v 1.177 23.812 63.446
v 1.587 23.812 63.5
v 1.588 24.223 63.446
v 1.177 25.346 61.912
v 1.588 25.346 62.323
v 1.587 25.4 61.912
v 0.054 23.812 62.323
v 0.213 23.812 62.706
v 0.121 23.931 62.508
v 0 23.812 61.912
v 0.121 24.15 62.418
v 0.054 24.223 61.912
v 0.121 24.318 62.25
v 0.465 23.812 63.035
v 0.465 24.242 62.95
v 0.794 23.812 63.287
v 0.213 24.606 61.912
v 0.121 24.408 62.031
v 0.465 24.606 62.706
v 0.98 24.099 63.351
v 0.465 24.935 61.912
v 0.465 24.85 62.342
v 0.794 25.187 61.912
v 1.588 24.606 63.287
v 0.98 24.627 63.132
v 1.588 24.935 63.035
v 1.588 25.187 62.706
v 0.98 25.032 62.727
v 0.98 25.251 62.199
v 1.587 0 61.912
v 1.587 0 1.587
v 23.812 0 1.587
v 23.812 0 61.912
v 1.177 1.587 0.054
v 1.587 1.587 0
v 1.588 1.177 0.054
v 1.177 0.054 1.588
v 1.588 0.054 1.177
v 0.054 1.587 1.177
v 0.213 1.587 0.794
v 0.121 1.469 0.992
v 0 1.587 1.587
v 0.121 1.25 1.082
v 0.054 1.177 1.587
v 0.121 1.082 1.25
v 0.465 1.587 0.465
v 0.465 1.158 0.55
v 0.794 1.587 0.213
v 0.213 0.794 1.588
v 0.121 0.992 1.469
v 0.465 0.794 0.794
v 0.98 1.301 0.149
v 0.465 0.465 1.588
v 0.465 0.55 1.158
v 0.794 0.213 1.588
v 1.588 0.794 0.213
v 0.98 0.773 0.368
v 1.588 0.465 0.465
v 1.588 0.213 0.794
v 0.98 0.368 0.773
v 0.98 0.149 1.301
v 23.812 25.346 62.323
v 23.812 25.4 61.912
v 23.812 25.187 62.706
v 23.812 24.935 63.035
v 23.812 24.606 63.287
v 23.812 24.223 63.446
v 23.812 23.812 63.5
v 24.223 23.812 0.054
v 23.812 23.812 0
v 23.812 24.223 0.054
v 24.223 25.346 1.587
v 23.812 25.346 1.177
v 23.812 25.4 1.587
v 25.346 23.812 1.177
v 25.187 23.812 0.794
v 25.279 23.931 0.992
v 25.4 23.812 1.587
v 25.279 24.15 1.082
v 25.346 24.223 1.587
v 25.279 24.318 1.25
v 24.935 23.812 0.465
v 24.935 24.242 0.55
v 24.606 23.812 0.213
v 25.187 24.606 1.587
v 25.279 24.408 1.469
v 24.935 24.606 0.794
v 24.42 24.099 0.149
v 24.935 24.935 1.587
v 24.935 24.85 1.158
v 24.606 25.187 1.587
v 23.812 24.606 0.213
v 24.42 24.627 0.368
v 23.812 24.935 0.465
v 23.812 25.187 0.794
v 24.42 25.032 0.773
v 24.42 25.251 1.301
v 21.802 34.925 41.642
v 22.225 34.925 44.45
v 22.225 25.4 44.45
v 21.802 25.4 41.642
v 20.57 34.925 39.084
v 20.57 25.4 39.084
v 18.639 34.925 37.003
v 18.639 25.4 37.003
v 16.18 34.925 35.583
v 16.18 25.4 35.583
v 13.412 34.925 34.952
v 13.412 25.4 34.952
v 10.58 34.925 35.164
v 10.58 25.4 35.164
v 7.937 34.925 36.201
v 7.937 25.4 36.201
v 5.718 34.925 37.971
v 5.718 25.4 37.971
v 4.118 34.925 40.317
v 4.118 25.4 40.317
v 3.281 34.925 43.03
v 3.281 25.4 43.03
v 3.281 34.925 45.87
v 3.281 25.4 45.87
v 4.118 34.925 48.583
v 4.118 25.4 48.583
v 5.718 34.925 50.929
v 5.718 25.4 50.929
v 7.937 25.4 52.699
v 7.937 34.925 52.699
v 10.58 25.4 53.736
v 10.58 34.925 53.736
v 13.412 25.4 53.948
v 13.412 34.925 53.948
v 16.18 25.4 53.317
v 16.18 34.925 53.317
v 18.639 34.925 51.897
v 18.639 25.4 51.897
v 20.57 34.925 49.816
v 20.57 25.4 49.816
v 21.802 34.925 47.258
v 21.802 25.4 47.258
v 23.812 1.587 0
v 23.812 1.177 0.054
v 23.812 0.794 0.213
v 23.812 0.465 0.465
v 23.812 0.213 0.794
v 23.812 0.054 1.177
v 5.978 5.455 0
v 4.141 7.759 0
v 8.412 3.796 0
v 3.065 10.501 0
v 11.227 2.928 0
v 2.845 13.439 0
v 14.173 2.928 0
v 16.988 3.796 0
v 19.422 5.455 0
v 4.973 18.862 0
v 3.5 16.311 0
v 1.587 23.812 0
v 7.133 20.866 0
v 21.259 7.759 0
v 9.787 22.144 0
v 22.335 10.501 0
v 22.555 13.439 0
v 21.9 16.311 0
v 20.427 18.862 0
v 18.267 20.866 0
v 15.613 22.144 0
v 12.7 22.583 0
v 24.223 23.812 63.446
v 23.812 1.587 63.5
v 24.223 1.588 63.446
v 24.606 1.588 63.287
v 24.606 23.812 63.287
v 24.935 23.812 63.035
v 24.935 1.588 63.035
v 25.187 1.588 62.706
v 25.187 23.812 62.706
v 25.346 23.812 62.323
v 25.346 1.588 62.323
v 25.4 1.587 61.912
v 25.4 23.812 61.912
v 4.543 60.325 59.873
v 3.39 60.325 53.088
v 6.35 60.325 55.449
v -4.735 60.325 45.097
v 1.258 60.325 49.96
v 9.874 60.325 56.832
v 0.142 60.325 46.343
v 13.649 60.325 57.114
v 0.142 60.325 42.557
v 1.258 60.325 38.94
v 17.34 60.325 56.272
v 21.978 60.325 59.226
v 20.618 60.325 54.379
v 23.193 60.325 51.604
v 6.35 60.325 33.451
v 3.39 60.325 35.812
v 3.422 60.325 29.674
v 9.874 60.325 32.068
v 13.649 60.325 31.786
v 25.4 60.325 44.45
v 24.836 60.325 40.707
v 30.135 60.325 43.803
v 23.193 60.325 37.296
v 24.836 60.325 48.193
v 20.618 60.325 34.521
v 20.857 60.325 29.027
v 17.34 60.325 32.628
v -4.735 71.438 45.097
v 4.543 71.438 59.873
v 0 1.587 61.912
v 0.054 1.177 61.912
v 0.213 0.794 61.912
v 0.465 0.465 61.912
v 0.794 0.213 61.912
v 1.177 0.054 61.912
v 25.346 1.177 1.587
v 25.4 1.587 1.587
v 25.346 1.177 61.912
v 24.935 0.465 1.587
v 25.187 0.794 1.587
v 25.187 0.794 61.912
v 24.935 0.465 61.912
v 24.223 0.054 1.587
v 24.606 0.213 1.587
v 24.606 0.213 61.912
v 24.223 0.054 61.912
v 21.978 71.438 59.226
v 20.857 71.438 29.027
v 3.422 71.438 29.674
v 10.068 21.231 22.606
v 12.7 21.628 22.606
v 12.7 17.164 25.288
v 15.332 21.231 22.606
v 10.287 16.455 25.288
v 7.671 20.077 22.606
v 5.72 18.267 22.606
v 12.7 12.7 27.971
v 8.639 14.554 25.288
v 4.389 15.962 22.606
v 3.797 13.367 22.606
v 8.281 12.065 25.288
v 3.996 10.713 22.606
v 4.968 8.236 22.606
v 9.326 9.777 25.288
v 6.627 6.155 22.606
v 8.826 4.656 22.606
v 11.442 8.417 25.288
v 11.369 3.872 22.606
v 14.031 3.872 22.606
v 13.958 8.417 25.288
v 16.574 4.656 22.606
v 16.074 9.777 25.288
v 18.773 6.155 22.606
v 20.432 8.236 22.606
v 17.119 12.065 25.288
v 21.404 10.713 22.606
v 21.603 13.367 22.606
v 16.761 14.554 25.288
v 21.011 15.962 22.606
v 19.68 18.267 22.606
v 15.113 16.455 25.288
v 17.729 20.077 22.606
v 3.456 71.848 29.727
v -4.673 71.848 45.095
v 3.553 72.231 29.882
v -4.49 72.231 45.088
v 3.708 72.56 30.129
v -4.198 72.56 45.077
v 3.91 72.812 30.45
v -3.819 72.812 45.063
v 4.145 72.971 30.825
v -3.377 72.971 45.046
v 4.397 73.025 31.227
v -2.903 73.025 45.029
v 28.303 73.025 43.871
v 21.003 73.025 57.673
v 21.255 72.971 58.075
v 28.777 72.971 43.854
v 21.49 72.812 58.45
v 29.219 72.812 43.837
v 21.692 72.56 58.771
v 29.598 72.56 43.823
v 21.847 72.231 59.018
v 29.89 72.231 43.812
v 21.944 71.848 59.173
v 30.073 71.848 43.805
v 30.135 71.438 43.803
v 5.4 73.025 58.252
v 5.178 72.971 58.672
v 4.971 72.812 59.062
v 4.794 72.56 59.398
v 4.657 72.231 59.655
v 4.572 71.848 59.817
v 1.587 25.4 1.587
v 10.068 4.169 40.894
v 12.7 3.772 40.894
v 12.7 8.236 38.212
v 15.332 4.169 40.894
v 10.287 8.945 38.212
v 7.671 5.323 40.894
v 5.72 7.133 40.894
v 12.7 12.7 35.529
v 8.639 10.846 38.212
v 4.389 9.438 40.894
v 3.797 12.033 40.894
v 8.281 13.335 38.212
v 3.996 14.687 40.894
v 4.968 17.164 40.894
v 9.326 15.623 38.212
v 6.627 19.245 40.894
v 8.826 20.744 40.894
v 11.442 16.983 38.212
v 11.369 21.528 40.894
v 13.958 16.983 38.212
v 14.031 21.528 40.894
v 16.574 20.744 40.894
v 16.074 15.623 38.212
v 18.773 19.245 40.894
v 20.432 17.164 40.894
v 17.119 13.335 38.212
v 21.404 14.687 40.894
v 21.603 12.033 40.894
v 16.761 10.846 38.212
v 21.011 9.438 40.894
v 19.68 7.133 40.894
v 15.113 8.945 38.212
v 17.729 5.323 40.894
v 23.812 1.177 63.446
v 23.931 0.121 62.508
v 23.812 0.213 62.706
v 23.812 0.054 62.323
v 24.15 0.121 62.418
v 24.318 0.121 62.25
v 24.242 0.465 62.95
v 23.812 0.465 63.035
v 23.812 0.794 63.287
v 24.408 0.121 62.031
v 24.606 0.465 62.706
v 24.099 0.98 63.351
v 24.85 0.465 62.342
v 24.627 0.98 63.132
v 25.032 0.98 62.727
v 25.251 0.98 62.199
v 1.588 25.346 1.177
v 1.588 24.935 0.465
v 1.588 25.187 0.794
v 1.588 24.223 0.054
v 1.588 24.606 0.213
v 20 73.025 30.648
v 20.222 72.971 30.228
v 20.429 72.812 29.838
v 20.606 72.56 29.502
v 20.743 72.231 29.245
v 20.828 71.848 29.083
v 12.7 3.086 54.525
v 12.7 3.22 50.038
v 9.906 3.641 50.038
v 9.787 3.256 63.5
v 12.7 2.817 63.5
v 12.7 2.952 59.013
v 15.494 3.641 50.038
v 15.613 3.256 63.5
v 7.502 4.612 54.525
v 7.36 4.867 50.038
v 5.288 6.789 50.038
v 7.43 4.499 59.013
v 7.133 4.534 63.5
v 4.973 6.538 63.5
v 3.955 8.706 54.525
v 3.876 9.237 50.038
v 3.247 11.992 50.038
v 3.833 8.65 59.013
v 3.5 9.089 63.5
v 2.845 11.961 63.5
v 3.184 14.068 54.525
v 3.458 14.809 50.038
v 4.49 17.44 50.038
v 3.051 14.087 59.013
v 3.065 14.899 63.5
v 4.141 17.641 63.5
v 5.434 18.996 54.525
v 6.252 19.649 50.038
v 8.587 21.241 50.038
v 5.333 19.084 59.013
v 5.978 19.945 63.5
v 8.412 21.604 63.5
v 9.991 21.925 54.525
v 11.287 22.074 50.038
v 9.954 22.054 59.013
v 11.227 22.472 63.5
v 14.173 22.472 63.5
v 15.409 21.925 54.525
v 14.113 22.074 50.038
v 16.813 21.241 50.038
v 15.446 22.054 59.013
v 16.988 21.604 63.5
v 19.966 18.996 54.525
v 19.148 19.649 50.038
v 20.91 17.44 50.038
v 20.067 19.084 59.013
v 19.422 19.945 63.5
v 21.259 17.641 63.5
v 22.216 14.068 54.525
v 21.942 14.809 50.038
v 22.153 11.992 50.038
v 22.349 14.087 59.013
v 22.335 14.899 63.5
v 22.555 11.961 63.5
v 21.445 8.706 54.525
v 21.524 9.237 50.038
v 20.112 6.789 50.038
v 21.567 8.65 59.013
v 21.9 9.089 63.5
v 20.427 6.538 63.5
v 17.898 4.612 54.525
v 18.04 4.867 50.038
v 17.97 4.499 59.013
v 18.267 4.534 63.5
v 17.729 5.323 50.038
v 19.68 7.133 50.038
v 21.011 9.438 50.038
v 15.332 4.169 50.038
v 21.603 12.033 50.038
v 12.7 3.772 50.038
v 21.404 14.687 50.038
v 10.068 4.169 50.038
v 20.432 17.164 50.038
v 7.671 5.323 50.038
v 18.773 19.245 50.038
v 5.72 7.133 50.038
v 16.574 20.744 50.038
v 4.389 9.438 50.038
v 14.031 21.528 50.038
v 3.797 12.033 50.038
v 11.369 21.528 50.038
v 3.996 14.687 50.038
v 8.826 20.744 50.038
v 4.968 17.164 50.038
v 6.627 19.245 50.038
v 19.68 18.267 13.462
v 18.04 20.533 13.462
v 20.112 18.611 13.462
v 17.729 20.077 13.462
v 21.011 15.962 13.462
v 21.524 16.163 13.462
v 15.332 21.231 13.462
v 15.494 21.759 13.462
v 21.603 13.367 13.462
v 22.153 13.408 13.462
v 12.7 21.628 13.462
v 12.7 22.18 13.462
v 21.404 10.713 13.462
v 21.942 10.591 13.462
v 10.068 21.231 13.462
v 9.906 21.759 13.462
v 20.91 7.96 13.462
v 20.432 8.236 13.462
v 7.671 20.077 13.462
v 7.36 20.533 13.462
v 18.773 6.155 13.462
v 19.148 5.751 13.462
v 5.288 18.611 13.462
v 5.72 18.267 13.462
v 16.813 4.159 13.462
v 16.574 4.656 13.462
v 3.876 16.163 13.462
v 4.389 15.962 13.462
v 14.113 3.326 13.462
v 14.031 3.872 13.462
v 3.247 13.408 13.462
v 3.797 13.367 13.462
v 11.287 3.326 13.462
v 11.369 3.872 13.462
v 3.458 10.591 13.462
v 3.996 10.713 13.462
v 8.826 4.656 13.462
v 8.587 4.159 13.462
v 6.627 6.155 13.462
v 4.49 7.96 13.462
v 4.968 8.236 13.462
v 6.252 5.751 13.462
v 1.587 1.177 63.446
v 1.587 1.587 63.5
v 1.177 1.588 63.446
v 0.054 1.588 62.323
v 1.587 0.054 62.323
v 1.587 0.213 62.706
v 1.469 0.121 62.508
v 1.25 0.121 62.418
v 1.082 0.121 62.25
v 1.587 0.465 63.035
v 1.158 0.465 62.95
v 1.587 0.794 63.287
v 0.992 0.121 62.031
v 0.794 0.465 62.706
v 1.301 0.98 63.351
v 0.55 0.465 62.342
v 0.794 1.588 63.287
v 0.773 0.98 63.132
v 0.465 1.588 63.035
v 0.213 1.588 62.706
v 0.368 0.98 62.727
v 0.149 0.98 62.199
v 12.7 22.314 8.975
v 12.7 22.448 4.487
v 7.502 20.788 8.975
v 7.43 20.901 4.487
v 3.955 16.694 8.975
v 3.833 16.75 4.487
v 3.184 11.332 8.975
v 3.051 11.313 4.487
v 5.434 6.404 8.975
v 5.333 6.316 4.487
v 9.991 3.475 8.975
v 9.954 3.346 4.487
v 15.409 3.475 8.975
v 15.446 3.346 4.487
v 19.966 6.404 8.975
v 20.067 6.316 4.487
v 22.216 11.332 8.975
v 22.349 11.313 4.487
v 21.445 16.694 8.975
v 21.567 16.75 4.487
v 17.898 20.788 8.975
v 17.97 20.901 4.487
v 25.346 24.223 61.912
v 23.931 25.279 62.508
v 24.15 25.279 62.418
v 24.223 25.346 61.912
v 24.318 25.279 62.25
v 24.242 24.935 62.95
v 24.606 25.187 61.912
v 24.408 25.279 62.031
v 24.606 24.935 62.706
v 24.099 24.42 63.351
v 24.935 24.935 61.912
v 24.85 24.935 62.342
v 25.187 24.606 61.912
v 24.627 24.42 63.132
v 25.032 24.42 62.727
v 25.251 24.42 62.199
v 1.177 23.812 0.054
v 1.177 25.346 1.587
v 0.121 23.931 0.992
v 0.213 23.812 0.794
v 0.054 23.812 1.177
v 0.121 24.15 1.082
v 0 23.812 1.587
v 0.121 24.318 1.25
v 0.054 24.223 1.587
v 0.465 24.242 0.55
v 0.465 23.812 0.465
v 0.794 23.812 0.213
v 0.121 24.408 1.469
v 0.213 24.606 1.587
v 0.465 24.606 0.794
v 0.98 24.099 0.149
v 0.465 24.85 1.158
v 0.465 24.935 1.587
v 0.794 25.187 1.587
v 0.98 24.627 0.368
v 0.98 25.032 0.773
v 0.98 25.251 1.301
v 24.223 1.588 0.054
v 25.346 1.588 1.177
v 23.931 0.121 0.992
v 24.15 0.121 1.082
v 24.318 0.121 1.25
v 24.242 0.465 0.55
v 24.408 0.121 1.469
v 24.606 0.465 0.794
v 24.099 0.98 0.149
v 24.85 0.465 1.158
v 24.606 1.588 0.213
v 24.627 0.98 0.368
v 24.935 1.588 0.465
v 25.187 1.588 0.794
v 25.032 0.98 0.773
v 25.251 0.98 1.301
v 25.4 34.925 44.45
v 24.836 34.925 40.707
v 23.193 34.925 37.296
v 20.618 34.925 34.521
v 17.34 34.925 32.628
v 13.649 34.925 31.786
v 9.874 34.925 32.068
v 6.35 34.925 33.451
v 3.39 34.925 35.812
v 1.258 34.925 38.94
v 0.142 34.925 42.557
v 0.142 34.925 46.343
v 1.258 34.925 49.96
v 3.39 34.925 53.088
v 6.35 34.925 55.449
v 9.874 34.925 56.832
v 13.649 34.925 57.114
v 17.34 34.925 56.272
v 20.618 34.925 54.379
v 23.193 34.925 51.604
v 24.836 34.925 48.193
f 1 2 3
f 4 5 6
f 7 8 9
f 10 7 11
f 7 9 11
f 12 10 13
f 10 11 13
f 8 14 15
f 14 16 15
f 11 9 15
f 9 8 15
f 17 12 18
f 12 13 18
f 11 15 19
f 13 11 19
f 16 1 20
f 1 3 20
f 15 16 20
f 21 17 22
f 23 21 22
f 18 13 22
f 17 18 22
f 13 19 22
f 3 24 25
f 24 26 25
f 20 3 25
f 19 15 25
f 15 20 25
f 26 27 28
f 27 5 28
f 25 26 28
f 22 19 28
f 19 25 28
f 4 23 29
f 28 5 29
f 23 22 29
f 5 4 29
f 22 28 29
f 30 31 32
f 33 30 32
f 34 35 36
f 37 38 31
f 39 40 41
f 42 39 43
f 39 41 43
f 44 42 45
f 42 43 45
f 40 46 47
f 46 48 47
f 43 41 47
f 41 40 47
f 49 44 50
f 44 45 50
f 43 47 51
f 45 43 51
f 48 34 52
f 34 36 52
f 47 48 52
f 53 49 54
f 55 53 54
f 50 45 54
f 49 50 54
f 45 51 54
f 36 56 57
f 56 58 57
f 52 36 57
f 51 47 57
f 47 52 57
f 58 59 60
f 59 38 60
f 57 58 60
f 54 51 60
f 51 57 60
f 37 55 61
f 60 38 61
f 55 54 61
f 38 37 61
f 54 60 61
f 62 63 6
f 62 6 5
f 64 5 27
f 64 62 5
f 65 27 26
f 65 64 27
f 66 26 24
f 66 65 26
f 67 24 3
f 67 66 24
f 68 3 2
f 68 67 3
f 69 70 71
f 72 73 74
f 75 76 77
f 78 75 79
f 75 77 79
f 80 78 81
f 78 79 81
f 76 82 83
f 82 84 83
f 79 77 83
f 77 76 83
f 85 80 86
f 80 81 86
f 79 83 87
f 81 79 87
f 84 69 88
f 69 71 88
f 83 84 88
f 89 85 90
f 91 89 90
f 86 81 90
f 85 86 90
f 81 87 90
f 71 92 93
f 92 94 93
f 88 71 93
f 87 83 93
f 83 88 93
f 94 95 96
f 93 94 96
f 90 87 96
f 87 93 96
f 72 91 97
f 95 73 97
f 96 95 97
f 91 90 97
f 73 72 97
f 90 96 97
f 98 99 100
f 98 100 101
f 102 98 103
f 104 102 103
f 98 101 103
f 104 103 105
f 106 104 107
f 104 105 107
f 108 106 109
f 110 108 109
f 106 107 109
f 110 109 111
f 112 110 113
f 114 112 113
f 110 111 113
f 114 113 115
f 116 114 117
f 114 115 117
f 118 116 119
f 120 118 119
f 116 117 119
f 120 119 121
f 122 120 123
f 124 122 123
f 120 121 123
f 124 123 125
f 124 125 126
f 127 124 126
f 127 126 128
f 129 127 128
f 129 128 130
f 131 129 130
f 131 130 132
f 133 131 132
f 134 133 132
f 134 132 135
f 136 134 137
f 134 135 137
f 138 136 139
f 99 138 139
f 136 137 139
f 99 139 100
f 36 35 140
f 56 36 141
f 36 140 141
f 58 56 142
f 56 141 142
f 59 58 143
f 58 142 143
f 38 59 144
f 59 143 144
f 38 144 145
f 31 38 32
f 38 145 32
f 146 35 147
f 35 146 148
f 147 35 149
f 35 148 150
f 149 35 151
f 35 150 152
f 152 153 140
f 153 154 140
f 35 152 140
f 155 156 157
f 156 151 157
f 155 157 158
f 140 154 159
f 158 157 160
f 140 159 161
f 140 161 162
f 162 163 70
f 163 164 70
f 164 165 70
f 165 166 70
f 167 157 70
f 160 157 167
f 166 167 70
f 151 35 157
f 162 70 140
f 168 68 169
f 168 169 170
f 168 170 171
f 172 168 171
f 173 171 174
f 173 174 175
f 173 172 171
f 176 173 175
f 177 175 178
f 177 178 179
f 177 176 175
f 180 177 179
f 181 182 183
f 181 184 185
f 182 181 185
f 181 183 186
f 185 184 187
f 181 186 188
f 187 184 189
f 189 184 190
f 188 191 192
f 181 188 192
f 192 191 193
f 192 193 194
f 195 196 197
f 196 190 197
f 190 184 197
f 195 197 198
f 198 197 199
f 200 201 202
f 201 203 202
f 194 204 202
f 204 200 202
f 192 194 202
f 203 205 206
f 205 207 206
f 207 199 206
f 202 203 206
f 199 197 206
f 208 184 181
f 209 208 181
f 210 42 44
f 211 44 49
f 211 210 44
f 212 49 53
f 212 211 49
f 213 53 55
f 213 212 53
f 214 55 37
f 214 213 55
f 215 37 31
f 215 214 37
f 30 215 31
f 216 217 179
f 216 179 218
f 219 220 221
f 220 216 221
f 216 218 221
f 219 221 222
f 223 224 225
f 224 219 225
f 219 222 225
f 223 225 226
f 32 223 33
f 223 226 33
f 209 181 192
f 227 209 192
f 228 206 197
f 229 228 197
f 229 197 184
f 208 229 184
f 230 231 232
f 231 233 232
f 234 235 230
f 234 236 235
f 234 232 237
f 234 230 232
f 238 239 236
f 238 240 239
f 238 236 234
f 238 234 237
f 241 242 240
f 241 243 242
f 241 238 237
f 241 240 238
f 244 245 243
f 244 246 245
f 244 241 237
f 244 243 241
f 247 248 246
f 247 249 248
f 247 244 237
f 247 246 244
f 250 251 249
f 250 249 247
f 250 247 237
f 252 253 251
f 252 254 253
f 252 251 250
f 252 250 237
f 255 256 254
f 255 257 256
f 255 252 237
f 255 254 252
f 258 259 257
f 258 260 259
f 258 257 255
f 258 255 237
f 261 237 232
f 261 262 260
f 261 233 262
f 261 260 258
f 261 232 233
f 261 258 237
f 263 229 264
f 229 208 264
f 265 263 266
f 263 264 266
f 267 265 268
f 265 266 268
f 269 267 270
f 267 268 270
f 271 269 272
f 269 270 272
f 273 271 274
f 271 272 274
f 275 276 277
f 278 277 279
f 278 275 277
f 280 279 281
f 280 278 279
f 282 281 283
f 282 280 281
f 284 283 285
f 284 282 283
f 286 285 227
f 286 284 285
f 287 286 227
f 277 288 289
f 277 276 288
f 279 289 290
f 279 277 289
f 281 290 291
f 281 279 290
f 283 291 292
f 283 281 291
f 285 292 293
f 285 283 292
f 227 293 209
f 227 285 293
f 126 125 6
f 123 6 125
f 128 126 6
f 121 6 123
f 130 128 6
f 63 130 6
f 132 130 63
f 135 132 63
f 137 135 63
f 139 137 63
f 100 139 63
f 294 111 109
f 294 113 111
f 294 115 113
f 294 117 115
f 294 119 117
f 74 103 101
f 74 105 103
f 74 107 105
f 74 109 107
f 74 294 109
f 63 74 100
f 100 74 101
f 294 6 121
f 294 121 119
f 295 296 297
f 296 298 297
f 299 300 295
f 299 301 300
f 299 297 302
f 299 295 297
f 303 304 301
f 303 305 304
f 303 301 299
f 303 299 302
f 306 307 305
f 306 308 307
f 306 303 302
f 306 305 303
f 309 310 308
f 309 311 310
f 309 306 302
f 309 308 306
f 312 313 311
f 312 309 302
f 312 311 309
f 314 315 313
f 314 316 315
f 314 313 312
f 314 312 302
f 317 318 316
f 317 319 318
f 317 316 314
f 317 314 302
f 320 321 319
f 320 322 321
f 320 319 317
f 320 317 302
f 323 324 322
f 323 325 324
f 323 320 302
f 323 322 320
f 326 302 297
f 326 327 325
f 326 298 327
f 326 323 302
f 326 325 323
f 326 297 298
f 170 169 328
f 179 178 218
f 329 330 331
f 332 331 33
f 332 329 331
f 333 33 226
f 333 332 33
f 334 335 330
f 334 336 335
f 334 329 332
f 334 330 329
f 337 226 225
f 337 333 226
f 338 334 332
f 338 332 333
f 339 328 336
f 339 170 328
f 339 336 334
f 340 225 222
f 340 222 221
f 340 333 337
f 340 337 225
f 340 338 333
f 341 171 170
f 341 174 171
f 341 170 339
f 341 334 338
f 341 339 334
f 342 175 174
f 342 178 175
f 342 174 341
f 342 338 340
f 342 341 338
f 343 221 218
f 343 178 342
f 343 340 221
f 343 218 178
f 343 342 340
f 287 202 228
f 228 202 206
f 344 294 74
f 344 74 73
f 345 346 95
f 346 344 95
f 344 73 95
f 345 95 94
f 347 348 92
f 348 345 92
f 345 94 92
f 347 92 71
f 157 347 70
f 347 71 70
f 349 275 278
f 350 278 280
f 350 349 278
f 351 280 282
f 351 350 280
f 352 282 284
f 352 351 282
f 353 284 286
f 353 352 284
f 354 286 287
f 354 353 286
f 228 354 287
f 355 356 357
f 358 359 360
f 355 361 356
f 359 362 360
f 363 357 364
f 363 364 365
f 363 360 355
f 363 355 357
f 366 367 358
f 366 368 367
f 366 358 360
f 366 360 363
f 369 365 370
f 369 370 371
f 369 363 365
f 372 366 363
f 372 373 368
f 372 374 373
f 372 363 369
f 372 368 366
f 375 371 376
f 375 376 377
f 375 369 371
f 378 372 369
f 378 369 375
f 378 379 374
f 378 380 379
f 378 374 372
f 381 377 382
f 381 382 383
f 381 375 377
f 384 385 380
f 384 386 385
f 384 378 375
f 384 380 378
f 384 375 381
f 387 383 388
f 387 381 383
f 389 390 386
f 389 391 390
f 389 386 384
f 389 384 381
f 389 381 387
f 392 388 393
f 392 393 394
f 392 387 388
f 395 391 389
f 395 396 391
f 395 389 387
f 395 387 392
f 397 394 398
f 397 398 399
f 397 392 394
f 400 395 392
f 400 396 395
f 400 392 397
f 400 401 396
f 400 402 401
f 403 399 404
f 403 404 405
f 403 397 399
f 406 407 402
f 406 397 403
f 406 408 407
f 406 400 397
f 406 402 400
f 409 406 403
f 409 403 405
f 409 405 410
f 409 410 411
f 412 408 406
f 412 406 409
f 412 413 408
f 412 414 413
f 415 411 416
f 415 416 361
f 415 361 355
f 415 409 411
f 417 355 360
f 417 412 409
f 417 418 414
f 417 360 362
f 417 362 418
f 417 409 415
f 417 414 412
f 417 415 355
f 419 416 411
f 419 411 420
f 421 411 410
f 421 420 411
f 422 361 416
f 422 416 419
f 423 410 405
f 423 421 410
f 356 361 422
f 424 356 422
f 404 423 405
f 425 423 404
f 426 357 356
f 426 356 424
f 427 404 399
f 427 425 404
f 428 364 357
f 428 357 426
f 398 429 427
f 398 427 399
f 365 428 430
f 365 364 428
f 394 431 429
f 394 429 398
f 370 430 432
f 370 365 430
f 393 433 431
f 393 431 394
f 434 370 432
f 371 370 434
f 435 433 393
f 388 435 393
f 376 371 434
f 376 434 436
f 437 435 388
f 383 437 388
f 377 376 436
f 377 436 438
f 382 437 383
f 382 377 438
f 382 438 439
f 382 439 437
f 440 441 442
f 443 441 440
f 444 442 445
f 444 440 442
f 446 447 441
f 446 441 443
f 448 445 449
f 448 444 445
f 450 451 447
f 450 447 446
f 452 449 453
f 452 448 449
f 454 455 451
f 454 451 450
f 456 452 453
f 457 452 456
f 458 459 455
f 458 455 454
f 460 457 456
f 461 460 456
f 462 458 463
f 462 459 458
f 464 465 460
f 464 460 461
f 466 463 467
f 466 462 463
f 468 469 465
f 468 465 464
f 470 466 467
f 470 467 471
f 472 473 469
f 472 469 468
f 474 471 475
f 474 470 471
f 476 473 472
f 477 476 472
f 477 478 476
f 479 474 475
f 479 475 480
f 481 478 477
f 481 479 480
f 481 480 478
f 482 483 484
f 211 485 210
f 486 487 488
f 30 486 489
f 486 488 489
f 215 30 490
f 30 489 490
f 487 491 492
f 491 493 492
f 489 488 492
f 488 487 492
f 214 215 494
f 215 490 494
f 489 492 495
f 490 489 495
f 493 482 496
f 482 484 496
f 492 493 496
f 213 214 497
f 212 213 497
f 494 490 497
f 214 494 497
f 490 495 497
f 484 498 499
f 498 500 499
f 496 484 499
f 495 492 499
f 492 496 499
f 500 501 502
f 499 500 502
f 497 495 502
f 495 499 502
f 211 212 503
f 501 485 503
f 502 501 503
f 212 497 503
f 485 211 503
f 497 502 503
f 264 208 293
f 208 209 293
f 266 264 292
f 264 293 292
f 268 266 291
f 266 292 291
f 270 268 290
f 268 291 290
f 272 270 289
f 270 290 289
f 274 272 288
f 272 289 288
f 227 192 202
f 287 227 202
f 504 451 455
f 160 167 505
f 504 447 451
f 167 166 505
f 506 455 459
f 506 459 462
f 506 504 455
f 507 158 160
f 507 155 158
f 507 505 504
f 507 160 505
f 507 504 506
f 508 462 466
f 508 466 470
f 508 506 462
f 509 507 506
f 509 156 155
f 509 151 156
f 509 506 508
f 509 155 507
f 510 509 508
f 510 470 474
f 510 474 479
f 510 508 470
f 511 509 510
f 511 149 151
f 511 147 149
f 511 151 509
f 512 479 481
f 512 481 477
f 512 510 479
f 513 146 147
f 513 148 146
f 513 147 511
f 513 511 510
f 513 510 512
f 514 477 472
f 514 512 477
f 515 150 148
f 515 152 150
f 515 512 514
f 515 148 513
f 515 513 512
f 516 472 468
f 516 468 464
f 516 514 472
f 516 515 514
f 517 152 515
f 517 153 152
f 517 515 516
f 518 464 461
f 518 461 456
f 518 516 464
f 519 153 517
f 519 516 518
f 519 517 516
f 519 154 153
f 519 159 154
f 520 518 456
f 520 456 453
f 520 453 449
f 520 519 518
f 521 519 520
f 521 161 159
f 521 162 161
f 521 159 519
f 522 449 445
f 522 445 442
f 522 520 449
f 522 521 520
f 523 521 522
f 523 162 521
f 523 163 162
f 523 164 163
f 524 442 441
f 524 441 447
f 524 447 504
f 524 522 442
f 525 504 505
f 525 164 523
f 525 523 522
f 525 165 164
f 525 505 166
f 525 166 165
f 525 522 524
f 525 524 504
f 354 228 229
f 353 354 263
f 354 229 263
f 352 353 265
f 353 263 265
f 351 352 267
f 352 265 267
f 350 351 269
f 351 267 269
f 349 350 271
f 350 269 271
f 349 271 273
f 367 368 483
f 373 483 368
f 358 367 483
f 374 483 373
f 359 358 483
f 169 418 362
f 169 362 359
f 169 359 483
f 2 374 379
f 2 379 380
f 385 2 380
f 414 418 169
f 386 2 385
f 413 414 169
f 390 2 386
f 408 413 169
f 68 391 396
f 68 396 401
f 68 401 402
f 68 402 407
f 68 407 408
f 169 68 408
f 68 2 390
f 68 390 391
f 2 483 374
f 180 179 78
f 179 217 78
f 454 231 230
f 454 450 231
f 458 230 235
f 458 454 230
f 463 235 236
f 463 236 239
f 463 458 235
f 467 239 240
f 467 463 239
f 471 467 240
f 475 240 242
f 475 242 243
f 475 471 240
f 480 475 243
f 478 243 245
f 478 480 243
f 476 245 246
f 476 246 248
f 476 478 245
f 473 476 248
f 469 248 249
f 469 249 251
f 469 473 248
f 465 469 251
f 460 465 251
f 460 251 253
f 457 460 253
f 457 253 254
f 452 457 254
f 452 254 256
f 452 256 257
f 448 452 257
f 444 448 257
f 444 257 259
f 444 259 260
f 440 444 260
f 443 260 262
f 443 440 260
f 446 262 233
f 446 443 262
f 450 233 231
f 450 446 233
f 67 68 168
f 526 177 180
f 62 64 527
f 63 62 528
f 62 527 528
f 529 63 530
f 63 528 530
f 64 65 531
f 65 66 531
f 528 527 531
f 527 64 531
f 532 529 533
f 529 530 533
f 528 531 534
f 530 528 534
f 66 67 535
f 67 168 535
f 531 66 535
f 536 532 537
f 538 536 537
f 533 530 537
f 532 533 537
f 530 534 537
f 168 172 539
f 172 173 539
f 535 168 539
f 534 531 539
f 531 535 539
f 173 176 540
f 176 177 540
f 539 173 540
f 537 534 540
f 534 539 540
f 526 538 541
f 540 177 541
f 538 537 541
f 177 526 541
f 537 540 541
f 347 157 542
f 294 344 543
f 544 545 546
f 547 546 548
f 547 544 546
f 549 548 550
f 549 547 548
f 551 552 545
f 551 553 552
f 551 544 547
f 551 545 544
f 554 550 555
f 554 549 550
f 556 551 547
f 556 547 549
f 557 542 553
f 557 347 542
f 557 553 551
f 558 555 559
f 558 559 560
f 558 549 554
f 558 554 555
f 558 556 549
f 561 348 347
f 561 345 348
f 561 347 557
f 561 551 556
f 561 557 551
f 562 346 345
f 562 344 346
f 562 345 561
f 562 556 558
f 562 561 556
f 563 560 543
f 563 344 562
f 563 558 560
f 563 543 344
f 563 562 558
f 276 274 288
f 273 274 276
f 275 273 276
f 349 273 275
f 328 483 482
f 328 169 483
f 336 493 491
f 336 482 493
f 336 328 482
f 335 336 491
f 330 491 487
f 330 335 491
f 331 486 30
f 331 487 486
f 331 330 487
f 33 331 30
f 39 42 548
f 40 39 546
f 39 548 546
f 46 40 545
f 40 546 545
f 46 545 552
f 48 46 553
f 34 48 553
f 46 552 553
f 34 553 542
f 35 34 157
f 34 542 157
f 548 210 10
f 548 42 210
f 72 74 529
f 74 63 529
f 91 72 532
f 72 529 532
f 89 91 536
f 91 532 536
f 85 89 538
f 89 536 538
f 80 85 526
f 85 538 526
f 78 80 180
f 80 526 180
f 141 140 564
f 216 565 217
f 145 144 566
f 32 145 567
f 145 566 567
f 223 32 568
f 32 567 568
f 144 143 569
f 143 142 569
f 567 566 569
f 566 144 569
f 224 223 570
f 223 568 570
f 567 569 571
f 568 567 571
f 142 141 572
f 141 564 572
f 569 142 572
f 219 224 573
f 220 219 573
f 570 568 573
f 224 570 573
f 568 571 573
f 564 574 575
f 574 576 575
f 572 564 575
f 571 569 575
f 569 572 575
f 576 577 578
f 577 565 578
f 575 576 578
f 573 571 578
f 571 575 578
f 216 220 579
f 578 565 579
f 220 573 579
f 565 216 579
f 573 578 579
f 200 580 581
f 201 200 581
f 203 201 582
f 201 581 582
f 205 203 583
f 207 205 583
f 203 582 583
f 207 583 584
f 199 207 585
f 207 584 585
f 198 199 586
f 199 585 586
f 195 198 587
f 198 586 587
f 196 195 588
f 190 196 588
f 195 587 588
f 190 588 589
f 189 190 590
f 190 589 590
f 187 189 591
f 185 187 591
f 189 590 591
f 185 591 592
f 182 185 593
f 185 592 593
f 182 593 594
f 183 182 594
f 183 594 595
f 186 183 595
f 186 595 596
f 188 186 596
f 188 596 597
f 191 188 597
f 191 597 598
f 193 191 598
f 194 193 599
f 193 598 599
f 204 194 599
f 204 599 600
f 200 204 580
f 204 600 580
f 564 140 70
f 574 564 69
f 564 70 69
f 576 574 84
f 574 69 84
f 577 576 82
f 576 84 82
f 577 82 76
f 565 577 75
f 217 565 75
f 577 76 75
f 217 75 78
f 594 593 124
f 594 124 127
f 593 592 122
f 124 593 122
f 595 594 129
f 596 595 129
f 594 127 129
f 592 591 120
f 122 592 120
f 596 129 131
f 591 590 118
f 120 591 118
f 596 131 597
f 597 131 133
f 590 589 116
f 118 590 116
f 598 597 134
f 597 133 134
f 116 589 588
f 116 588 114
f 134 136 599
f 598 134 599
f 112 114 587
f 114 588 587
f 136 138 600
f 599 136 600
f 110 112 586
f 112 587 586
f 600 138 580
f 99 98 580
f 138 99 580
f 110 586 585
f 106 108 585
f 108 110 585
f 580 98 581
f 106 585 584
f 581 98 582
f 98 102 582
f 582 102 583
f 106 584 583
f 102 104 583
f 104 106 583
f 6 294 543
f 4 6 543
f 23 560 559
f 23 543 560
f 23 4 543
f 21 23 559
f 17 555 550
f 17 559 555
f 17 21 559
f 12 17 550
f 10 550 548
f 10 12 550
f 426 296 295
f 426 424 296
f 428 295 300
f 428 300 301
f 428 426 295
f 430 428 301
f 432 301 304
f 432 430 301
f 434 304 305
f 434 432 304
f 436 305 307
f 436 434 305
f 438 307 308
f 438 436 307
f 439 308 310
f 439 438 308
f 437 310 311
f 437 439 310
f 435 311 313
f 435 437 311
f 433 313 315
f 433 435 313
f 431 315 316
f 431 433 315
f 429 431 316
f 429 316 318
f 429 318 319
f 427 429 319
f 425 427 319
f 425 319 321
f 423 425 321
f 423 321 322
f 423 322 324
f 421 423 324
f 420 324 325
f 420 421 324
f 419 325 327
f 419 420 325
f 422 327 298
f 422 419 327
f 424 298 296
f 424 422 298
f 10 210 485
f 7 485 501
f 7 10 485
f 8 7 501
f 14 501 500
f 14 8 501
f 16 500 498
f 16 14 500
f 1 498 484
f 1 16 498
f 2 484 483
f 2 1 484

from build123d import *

# Parameters (mm, degrees)
SKETCH1_W           = 25.4
SKETCH1_H           = 25.4
BOSS_EXTRUDE1_DEPTH = 63.5
SKETCH4_R           = 9.525
BOSS_EXTRUDE2_DEPTH = 9.525
SKETCH5_R           = 12.7
BOSS_EXTRUDE3_DEPTH = 25.4
BOSS_EXTRUDE4_DEPTH = 12.7
FILLET1_R           = 1.5875


with BuildPart() as part:
    # Sketch1 → Boss-Extrude1 (new body)
    with BuildSketch(Plane.XY):
        with Locations((12.7, 12.7)):
            Rectangle(SKETCH1_W, SKETCH1_H)
    extrude(amount=BOSS_EXTRUDE1_DEPTH)

    # Sketch2 → 1/2 NPT Tapped Hole1 (revolve, cut)
    with BuildSketch(Plane(origin=(12.7, 12.7, 63.5), x_dir=(0, -1, 0), z_dir=(1, 0, 0))):
        Polygon((0, 0), (0, 27.970543693), (8.9281, 22.606), (8.9281, 13.462), (9.479726792, 13.462), (9.8827971, 0), align=None)
    revolve(axis=Axis((12.7, 12.7, 69.85), (0, 0, -1)), mode=Mode.SUBTRACT)

    # Sketch4 → Boss-Extrude2 (add)
    with BuildSketch(Plane(origin=(0, 25.4, 0), x_dir=(1, 0, 0), z_dir=(0, 1, 0))):
        with Locations((12.7, -44.45)):
            Circle(SKETCH4_R)
    extrude(amount=BOSS_EXTRUDE2_DEPTH)

    # Sketch5 → Boss-Extrude3 (add)
    with BuildSketch(Plane(origin=(0, 34.925, 0), x_dir=(1, 0, 0), z_dir=(0, 1, 0))):
        with Locations((12.7, -44.45)):
            Circle(SKETCH5_R)
    extrude(amount=BOSS_EXTRUDE3_DEPTH)

    # Sketch6 → Boss-Extrude4 (add)
    with BuildSketch(Plane(origin=(0, 60.325, 0), x_dir=(1, 0, 0), z_dir=(0, 1, 0))):
        Polygon((3.422327472, -29.674263649), (-4.734999304, -45.096831921), (4.542673224, -59.872568273), (21.977672528, -59.225736351), (30.134999304, -43.803168079), (20.857326776, -29.027431727), align=None)
    extrude(amount=BOSS_EXTRUDE4_DEPTH)

    # Sketch7 → 1/2 NPT Tapped Hole2 (revolve, cut)
    with BuildSketch(Plane(origin=(12.7, 12.7, 0), x_dir=(0, 1, 0), z_dir=(1, 0, 0))):
        Polygon((0, 0), (0, 27.970543693), (8.9281, 22.606), (8.9281, 13.462), (9.479726792, 13.462), (9.8827971, 0), align=None)
    revolve(axis=Axis((12.7, 12.7, -6.35), (0, 0, 1)), mode=Mode.SUBTRACT)

    # Fillet1
    fillet1_edges = [part.edges().sort_by_distance(p)[0] for p in [
        (25.4, 12.7, 63.5),
        (12.7, 25.4, 63.5),
        (12.139827124, 73.025, 29.350847688),
        (-0.656335916, 73.025, 37.385547785),
        (-0.09616304, 73.025, 52.484700097),
        (13.260172876, 73.025, 59.549152312),
        (26.056335916, 73.025, 51.514452215),
        (25.49616304, 73.025, 36.415299903),
        (0, 12.7, 63.5),
        (12.7, 25.4, 0),
        (25.4, 12.7, 0),
        (12.7, 0, 0),
        (0, 12.7, 0),
        (12.7, 0, 63.5),
        (0, 25.4, 31.75),
        (25.4, 25.4, 31.75),
        (25.4, 0, 31.75),
        (0, 0, 31.75),
    ]]
    fillet(fillet1_edges, radius=FILLET1_R)


solid = part.part
